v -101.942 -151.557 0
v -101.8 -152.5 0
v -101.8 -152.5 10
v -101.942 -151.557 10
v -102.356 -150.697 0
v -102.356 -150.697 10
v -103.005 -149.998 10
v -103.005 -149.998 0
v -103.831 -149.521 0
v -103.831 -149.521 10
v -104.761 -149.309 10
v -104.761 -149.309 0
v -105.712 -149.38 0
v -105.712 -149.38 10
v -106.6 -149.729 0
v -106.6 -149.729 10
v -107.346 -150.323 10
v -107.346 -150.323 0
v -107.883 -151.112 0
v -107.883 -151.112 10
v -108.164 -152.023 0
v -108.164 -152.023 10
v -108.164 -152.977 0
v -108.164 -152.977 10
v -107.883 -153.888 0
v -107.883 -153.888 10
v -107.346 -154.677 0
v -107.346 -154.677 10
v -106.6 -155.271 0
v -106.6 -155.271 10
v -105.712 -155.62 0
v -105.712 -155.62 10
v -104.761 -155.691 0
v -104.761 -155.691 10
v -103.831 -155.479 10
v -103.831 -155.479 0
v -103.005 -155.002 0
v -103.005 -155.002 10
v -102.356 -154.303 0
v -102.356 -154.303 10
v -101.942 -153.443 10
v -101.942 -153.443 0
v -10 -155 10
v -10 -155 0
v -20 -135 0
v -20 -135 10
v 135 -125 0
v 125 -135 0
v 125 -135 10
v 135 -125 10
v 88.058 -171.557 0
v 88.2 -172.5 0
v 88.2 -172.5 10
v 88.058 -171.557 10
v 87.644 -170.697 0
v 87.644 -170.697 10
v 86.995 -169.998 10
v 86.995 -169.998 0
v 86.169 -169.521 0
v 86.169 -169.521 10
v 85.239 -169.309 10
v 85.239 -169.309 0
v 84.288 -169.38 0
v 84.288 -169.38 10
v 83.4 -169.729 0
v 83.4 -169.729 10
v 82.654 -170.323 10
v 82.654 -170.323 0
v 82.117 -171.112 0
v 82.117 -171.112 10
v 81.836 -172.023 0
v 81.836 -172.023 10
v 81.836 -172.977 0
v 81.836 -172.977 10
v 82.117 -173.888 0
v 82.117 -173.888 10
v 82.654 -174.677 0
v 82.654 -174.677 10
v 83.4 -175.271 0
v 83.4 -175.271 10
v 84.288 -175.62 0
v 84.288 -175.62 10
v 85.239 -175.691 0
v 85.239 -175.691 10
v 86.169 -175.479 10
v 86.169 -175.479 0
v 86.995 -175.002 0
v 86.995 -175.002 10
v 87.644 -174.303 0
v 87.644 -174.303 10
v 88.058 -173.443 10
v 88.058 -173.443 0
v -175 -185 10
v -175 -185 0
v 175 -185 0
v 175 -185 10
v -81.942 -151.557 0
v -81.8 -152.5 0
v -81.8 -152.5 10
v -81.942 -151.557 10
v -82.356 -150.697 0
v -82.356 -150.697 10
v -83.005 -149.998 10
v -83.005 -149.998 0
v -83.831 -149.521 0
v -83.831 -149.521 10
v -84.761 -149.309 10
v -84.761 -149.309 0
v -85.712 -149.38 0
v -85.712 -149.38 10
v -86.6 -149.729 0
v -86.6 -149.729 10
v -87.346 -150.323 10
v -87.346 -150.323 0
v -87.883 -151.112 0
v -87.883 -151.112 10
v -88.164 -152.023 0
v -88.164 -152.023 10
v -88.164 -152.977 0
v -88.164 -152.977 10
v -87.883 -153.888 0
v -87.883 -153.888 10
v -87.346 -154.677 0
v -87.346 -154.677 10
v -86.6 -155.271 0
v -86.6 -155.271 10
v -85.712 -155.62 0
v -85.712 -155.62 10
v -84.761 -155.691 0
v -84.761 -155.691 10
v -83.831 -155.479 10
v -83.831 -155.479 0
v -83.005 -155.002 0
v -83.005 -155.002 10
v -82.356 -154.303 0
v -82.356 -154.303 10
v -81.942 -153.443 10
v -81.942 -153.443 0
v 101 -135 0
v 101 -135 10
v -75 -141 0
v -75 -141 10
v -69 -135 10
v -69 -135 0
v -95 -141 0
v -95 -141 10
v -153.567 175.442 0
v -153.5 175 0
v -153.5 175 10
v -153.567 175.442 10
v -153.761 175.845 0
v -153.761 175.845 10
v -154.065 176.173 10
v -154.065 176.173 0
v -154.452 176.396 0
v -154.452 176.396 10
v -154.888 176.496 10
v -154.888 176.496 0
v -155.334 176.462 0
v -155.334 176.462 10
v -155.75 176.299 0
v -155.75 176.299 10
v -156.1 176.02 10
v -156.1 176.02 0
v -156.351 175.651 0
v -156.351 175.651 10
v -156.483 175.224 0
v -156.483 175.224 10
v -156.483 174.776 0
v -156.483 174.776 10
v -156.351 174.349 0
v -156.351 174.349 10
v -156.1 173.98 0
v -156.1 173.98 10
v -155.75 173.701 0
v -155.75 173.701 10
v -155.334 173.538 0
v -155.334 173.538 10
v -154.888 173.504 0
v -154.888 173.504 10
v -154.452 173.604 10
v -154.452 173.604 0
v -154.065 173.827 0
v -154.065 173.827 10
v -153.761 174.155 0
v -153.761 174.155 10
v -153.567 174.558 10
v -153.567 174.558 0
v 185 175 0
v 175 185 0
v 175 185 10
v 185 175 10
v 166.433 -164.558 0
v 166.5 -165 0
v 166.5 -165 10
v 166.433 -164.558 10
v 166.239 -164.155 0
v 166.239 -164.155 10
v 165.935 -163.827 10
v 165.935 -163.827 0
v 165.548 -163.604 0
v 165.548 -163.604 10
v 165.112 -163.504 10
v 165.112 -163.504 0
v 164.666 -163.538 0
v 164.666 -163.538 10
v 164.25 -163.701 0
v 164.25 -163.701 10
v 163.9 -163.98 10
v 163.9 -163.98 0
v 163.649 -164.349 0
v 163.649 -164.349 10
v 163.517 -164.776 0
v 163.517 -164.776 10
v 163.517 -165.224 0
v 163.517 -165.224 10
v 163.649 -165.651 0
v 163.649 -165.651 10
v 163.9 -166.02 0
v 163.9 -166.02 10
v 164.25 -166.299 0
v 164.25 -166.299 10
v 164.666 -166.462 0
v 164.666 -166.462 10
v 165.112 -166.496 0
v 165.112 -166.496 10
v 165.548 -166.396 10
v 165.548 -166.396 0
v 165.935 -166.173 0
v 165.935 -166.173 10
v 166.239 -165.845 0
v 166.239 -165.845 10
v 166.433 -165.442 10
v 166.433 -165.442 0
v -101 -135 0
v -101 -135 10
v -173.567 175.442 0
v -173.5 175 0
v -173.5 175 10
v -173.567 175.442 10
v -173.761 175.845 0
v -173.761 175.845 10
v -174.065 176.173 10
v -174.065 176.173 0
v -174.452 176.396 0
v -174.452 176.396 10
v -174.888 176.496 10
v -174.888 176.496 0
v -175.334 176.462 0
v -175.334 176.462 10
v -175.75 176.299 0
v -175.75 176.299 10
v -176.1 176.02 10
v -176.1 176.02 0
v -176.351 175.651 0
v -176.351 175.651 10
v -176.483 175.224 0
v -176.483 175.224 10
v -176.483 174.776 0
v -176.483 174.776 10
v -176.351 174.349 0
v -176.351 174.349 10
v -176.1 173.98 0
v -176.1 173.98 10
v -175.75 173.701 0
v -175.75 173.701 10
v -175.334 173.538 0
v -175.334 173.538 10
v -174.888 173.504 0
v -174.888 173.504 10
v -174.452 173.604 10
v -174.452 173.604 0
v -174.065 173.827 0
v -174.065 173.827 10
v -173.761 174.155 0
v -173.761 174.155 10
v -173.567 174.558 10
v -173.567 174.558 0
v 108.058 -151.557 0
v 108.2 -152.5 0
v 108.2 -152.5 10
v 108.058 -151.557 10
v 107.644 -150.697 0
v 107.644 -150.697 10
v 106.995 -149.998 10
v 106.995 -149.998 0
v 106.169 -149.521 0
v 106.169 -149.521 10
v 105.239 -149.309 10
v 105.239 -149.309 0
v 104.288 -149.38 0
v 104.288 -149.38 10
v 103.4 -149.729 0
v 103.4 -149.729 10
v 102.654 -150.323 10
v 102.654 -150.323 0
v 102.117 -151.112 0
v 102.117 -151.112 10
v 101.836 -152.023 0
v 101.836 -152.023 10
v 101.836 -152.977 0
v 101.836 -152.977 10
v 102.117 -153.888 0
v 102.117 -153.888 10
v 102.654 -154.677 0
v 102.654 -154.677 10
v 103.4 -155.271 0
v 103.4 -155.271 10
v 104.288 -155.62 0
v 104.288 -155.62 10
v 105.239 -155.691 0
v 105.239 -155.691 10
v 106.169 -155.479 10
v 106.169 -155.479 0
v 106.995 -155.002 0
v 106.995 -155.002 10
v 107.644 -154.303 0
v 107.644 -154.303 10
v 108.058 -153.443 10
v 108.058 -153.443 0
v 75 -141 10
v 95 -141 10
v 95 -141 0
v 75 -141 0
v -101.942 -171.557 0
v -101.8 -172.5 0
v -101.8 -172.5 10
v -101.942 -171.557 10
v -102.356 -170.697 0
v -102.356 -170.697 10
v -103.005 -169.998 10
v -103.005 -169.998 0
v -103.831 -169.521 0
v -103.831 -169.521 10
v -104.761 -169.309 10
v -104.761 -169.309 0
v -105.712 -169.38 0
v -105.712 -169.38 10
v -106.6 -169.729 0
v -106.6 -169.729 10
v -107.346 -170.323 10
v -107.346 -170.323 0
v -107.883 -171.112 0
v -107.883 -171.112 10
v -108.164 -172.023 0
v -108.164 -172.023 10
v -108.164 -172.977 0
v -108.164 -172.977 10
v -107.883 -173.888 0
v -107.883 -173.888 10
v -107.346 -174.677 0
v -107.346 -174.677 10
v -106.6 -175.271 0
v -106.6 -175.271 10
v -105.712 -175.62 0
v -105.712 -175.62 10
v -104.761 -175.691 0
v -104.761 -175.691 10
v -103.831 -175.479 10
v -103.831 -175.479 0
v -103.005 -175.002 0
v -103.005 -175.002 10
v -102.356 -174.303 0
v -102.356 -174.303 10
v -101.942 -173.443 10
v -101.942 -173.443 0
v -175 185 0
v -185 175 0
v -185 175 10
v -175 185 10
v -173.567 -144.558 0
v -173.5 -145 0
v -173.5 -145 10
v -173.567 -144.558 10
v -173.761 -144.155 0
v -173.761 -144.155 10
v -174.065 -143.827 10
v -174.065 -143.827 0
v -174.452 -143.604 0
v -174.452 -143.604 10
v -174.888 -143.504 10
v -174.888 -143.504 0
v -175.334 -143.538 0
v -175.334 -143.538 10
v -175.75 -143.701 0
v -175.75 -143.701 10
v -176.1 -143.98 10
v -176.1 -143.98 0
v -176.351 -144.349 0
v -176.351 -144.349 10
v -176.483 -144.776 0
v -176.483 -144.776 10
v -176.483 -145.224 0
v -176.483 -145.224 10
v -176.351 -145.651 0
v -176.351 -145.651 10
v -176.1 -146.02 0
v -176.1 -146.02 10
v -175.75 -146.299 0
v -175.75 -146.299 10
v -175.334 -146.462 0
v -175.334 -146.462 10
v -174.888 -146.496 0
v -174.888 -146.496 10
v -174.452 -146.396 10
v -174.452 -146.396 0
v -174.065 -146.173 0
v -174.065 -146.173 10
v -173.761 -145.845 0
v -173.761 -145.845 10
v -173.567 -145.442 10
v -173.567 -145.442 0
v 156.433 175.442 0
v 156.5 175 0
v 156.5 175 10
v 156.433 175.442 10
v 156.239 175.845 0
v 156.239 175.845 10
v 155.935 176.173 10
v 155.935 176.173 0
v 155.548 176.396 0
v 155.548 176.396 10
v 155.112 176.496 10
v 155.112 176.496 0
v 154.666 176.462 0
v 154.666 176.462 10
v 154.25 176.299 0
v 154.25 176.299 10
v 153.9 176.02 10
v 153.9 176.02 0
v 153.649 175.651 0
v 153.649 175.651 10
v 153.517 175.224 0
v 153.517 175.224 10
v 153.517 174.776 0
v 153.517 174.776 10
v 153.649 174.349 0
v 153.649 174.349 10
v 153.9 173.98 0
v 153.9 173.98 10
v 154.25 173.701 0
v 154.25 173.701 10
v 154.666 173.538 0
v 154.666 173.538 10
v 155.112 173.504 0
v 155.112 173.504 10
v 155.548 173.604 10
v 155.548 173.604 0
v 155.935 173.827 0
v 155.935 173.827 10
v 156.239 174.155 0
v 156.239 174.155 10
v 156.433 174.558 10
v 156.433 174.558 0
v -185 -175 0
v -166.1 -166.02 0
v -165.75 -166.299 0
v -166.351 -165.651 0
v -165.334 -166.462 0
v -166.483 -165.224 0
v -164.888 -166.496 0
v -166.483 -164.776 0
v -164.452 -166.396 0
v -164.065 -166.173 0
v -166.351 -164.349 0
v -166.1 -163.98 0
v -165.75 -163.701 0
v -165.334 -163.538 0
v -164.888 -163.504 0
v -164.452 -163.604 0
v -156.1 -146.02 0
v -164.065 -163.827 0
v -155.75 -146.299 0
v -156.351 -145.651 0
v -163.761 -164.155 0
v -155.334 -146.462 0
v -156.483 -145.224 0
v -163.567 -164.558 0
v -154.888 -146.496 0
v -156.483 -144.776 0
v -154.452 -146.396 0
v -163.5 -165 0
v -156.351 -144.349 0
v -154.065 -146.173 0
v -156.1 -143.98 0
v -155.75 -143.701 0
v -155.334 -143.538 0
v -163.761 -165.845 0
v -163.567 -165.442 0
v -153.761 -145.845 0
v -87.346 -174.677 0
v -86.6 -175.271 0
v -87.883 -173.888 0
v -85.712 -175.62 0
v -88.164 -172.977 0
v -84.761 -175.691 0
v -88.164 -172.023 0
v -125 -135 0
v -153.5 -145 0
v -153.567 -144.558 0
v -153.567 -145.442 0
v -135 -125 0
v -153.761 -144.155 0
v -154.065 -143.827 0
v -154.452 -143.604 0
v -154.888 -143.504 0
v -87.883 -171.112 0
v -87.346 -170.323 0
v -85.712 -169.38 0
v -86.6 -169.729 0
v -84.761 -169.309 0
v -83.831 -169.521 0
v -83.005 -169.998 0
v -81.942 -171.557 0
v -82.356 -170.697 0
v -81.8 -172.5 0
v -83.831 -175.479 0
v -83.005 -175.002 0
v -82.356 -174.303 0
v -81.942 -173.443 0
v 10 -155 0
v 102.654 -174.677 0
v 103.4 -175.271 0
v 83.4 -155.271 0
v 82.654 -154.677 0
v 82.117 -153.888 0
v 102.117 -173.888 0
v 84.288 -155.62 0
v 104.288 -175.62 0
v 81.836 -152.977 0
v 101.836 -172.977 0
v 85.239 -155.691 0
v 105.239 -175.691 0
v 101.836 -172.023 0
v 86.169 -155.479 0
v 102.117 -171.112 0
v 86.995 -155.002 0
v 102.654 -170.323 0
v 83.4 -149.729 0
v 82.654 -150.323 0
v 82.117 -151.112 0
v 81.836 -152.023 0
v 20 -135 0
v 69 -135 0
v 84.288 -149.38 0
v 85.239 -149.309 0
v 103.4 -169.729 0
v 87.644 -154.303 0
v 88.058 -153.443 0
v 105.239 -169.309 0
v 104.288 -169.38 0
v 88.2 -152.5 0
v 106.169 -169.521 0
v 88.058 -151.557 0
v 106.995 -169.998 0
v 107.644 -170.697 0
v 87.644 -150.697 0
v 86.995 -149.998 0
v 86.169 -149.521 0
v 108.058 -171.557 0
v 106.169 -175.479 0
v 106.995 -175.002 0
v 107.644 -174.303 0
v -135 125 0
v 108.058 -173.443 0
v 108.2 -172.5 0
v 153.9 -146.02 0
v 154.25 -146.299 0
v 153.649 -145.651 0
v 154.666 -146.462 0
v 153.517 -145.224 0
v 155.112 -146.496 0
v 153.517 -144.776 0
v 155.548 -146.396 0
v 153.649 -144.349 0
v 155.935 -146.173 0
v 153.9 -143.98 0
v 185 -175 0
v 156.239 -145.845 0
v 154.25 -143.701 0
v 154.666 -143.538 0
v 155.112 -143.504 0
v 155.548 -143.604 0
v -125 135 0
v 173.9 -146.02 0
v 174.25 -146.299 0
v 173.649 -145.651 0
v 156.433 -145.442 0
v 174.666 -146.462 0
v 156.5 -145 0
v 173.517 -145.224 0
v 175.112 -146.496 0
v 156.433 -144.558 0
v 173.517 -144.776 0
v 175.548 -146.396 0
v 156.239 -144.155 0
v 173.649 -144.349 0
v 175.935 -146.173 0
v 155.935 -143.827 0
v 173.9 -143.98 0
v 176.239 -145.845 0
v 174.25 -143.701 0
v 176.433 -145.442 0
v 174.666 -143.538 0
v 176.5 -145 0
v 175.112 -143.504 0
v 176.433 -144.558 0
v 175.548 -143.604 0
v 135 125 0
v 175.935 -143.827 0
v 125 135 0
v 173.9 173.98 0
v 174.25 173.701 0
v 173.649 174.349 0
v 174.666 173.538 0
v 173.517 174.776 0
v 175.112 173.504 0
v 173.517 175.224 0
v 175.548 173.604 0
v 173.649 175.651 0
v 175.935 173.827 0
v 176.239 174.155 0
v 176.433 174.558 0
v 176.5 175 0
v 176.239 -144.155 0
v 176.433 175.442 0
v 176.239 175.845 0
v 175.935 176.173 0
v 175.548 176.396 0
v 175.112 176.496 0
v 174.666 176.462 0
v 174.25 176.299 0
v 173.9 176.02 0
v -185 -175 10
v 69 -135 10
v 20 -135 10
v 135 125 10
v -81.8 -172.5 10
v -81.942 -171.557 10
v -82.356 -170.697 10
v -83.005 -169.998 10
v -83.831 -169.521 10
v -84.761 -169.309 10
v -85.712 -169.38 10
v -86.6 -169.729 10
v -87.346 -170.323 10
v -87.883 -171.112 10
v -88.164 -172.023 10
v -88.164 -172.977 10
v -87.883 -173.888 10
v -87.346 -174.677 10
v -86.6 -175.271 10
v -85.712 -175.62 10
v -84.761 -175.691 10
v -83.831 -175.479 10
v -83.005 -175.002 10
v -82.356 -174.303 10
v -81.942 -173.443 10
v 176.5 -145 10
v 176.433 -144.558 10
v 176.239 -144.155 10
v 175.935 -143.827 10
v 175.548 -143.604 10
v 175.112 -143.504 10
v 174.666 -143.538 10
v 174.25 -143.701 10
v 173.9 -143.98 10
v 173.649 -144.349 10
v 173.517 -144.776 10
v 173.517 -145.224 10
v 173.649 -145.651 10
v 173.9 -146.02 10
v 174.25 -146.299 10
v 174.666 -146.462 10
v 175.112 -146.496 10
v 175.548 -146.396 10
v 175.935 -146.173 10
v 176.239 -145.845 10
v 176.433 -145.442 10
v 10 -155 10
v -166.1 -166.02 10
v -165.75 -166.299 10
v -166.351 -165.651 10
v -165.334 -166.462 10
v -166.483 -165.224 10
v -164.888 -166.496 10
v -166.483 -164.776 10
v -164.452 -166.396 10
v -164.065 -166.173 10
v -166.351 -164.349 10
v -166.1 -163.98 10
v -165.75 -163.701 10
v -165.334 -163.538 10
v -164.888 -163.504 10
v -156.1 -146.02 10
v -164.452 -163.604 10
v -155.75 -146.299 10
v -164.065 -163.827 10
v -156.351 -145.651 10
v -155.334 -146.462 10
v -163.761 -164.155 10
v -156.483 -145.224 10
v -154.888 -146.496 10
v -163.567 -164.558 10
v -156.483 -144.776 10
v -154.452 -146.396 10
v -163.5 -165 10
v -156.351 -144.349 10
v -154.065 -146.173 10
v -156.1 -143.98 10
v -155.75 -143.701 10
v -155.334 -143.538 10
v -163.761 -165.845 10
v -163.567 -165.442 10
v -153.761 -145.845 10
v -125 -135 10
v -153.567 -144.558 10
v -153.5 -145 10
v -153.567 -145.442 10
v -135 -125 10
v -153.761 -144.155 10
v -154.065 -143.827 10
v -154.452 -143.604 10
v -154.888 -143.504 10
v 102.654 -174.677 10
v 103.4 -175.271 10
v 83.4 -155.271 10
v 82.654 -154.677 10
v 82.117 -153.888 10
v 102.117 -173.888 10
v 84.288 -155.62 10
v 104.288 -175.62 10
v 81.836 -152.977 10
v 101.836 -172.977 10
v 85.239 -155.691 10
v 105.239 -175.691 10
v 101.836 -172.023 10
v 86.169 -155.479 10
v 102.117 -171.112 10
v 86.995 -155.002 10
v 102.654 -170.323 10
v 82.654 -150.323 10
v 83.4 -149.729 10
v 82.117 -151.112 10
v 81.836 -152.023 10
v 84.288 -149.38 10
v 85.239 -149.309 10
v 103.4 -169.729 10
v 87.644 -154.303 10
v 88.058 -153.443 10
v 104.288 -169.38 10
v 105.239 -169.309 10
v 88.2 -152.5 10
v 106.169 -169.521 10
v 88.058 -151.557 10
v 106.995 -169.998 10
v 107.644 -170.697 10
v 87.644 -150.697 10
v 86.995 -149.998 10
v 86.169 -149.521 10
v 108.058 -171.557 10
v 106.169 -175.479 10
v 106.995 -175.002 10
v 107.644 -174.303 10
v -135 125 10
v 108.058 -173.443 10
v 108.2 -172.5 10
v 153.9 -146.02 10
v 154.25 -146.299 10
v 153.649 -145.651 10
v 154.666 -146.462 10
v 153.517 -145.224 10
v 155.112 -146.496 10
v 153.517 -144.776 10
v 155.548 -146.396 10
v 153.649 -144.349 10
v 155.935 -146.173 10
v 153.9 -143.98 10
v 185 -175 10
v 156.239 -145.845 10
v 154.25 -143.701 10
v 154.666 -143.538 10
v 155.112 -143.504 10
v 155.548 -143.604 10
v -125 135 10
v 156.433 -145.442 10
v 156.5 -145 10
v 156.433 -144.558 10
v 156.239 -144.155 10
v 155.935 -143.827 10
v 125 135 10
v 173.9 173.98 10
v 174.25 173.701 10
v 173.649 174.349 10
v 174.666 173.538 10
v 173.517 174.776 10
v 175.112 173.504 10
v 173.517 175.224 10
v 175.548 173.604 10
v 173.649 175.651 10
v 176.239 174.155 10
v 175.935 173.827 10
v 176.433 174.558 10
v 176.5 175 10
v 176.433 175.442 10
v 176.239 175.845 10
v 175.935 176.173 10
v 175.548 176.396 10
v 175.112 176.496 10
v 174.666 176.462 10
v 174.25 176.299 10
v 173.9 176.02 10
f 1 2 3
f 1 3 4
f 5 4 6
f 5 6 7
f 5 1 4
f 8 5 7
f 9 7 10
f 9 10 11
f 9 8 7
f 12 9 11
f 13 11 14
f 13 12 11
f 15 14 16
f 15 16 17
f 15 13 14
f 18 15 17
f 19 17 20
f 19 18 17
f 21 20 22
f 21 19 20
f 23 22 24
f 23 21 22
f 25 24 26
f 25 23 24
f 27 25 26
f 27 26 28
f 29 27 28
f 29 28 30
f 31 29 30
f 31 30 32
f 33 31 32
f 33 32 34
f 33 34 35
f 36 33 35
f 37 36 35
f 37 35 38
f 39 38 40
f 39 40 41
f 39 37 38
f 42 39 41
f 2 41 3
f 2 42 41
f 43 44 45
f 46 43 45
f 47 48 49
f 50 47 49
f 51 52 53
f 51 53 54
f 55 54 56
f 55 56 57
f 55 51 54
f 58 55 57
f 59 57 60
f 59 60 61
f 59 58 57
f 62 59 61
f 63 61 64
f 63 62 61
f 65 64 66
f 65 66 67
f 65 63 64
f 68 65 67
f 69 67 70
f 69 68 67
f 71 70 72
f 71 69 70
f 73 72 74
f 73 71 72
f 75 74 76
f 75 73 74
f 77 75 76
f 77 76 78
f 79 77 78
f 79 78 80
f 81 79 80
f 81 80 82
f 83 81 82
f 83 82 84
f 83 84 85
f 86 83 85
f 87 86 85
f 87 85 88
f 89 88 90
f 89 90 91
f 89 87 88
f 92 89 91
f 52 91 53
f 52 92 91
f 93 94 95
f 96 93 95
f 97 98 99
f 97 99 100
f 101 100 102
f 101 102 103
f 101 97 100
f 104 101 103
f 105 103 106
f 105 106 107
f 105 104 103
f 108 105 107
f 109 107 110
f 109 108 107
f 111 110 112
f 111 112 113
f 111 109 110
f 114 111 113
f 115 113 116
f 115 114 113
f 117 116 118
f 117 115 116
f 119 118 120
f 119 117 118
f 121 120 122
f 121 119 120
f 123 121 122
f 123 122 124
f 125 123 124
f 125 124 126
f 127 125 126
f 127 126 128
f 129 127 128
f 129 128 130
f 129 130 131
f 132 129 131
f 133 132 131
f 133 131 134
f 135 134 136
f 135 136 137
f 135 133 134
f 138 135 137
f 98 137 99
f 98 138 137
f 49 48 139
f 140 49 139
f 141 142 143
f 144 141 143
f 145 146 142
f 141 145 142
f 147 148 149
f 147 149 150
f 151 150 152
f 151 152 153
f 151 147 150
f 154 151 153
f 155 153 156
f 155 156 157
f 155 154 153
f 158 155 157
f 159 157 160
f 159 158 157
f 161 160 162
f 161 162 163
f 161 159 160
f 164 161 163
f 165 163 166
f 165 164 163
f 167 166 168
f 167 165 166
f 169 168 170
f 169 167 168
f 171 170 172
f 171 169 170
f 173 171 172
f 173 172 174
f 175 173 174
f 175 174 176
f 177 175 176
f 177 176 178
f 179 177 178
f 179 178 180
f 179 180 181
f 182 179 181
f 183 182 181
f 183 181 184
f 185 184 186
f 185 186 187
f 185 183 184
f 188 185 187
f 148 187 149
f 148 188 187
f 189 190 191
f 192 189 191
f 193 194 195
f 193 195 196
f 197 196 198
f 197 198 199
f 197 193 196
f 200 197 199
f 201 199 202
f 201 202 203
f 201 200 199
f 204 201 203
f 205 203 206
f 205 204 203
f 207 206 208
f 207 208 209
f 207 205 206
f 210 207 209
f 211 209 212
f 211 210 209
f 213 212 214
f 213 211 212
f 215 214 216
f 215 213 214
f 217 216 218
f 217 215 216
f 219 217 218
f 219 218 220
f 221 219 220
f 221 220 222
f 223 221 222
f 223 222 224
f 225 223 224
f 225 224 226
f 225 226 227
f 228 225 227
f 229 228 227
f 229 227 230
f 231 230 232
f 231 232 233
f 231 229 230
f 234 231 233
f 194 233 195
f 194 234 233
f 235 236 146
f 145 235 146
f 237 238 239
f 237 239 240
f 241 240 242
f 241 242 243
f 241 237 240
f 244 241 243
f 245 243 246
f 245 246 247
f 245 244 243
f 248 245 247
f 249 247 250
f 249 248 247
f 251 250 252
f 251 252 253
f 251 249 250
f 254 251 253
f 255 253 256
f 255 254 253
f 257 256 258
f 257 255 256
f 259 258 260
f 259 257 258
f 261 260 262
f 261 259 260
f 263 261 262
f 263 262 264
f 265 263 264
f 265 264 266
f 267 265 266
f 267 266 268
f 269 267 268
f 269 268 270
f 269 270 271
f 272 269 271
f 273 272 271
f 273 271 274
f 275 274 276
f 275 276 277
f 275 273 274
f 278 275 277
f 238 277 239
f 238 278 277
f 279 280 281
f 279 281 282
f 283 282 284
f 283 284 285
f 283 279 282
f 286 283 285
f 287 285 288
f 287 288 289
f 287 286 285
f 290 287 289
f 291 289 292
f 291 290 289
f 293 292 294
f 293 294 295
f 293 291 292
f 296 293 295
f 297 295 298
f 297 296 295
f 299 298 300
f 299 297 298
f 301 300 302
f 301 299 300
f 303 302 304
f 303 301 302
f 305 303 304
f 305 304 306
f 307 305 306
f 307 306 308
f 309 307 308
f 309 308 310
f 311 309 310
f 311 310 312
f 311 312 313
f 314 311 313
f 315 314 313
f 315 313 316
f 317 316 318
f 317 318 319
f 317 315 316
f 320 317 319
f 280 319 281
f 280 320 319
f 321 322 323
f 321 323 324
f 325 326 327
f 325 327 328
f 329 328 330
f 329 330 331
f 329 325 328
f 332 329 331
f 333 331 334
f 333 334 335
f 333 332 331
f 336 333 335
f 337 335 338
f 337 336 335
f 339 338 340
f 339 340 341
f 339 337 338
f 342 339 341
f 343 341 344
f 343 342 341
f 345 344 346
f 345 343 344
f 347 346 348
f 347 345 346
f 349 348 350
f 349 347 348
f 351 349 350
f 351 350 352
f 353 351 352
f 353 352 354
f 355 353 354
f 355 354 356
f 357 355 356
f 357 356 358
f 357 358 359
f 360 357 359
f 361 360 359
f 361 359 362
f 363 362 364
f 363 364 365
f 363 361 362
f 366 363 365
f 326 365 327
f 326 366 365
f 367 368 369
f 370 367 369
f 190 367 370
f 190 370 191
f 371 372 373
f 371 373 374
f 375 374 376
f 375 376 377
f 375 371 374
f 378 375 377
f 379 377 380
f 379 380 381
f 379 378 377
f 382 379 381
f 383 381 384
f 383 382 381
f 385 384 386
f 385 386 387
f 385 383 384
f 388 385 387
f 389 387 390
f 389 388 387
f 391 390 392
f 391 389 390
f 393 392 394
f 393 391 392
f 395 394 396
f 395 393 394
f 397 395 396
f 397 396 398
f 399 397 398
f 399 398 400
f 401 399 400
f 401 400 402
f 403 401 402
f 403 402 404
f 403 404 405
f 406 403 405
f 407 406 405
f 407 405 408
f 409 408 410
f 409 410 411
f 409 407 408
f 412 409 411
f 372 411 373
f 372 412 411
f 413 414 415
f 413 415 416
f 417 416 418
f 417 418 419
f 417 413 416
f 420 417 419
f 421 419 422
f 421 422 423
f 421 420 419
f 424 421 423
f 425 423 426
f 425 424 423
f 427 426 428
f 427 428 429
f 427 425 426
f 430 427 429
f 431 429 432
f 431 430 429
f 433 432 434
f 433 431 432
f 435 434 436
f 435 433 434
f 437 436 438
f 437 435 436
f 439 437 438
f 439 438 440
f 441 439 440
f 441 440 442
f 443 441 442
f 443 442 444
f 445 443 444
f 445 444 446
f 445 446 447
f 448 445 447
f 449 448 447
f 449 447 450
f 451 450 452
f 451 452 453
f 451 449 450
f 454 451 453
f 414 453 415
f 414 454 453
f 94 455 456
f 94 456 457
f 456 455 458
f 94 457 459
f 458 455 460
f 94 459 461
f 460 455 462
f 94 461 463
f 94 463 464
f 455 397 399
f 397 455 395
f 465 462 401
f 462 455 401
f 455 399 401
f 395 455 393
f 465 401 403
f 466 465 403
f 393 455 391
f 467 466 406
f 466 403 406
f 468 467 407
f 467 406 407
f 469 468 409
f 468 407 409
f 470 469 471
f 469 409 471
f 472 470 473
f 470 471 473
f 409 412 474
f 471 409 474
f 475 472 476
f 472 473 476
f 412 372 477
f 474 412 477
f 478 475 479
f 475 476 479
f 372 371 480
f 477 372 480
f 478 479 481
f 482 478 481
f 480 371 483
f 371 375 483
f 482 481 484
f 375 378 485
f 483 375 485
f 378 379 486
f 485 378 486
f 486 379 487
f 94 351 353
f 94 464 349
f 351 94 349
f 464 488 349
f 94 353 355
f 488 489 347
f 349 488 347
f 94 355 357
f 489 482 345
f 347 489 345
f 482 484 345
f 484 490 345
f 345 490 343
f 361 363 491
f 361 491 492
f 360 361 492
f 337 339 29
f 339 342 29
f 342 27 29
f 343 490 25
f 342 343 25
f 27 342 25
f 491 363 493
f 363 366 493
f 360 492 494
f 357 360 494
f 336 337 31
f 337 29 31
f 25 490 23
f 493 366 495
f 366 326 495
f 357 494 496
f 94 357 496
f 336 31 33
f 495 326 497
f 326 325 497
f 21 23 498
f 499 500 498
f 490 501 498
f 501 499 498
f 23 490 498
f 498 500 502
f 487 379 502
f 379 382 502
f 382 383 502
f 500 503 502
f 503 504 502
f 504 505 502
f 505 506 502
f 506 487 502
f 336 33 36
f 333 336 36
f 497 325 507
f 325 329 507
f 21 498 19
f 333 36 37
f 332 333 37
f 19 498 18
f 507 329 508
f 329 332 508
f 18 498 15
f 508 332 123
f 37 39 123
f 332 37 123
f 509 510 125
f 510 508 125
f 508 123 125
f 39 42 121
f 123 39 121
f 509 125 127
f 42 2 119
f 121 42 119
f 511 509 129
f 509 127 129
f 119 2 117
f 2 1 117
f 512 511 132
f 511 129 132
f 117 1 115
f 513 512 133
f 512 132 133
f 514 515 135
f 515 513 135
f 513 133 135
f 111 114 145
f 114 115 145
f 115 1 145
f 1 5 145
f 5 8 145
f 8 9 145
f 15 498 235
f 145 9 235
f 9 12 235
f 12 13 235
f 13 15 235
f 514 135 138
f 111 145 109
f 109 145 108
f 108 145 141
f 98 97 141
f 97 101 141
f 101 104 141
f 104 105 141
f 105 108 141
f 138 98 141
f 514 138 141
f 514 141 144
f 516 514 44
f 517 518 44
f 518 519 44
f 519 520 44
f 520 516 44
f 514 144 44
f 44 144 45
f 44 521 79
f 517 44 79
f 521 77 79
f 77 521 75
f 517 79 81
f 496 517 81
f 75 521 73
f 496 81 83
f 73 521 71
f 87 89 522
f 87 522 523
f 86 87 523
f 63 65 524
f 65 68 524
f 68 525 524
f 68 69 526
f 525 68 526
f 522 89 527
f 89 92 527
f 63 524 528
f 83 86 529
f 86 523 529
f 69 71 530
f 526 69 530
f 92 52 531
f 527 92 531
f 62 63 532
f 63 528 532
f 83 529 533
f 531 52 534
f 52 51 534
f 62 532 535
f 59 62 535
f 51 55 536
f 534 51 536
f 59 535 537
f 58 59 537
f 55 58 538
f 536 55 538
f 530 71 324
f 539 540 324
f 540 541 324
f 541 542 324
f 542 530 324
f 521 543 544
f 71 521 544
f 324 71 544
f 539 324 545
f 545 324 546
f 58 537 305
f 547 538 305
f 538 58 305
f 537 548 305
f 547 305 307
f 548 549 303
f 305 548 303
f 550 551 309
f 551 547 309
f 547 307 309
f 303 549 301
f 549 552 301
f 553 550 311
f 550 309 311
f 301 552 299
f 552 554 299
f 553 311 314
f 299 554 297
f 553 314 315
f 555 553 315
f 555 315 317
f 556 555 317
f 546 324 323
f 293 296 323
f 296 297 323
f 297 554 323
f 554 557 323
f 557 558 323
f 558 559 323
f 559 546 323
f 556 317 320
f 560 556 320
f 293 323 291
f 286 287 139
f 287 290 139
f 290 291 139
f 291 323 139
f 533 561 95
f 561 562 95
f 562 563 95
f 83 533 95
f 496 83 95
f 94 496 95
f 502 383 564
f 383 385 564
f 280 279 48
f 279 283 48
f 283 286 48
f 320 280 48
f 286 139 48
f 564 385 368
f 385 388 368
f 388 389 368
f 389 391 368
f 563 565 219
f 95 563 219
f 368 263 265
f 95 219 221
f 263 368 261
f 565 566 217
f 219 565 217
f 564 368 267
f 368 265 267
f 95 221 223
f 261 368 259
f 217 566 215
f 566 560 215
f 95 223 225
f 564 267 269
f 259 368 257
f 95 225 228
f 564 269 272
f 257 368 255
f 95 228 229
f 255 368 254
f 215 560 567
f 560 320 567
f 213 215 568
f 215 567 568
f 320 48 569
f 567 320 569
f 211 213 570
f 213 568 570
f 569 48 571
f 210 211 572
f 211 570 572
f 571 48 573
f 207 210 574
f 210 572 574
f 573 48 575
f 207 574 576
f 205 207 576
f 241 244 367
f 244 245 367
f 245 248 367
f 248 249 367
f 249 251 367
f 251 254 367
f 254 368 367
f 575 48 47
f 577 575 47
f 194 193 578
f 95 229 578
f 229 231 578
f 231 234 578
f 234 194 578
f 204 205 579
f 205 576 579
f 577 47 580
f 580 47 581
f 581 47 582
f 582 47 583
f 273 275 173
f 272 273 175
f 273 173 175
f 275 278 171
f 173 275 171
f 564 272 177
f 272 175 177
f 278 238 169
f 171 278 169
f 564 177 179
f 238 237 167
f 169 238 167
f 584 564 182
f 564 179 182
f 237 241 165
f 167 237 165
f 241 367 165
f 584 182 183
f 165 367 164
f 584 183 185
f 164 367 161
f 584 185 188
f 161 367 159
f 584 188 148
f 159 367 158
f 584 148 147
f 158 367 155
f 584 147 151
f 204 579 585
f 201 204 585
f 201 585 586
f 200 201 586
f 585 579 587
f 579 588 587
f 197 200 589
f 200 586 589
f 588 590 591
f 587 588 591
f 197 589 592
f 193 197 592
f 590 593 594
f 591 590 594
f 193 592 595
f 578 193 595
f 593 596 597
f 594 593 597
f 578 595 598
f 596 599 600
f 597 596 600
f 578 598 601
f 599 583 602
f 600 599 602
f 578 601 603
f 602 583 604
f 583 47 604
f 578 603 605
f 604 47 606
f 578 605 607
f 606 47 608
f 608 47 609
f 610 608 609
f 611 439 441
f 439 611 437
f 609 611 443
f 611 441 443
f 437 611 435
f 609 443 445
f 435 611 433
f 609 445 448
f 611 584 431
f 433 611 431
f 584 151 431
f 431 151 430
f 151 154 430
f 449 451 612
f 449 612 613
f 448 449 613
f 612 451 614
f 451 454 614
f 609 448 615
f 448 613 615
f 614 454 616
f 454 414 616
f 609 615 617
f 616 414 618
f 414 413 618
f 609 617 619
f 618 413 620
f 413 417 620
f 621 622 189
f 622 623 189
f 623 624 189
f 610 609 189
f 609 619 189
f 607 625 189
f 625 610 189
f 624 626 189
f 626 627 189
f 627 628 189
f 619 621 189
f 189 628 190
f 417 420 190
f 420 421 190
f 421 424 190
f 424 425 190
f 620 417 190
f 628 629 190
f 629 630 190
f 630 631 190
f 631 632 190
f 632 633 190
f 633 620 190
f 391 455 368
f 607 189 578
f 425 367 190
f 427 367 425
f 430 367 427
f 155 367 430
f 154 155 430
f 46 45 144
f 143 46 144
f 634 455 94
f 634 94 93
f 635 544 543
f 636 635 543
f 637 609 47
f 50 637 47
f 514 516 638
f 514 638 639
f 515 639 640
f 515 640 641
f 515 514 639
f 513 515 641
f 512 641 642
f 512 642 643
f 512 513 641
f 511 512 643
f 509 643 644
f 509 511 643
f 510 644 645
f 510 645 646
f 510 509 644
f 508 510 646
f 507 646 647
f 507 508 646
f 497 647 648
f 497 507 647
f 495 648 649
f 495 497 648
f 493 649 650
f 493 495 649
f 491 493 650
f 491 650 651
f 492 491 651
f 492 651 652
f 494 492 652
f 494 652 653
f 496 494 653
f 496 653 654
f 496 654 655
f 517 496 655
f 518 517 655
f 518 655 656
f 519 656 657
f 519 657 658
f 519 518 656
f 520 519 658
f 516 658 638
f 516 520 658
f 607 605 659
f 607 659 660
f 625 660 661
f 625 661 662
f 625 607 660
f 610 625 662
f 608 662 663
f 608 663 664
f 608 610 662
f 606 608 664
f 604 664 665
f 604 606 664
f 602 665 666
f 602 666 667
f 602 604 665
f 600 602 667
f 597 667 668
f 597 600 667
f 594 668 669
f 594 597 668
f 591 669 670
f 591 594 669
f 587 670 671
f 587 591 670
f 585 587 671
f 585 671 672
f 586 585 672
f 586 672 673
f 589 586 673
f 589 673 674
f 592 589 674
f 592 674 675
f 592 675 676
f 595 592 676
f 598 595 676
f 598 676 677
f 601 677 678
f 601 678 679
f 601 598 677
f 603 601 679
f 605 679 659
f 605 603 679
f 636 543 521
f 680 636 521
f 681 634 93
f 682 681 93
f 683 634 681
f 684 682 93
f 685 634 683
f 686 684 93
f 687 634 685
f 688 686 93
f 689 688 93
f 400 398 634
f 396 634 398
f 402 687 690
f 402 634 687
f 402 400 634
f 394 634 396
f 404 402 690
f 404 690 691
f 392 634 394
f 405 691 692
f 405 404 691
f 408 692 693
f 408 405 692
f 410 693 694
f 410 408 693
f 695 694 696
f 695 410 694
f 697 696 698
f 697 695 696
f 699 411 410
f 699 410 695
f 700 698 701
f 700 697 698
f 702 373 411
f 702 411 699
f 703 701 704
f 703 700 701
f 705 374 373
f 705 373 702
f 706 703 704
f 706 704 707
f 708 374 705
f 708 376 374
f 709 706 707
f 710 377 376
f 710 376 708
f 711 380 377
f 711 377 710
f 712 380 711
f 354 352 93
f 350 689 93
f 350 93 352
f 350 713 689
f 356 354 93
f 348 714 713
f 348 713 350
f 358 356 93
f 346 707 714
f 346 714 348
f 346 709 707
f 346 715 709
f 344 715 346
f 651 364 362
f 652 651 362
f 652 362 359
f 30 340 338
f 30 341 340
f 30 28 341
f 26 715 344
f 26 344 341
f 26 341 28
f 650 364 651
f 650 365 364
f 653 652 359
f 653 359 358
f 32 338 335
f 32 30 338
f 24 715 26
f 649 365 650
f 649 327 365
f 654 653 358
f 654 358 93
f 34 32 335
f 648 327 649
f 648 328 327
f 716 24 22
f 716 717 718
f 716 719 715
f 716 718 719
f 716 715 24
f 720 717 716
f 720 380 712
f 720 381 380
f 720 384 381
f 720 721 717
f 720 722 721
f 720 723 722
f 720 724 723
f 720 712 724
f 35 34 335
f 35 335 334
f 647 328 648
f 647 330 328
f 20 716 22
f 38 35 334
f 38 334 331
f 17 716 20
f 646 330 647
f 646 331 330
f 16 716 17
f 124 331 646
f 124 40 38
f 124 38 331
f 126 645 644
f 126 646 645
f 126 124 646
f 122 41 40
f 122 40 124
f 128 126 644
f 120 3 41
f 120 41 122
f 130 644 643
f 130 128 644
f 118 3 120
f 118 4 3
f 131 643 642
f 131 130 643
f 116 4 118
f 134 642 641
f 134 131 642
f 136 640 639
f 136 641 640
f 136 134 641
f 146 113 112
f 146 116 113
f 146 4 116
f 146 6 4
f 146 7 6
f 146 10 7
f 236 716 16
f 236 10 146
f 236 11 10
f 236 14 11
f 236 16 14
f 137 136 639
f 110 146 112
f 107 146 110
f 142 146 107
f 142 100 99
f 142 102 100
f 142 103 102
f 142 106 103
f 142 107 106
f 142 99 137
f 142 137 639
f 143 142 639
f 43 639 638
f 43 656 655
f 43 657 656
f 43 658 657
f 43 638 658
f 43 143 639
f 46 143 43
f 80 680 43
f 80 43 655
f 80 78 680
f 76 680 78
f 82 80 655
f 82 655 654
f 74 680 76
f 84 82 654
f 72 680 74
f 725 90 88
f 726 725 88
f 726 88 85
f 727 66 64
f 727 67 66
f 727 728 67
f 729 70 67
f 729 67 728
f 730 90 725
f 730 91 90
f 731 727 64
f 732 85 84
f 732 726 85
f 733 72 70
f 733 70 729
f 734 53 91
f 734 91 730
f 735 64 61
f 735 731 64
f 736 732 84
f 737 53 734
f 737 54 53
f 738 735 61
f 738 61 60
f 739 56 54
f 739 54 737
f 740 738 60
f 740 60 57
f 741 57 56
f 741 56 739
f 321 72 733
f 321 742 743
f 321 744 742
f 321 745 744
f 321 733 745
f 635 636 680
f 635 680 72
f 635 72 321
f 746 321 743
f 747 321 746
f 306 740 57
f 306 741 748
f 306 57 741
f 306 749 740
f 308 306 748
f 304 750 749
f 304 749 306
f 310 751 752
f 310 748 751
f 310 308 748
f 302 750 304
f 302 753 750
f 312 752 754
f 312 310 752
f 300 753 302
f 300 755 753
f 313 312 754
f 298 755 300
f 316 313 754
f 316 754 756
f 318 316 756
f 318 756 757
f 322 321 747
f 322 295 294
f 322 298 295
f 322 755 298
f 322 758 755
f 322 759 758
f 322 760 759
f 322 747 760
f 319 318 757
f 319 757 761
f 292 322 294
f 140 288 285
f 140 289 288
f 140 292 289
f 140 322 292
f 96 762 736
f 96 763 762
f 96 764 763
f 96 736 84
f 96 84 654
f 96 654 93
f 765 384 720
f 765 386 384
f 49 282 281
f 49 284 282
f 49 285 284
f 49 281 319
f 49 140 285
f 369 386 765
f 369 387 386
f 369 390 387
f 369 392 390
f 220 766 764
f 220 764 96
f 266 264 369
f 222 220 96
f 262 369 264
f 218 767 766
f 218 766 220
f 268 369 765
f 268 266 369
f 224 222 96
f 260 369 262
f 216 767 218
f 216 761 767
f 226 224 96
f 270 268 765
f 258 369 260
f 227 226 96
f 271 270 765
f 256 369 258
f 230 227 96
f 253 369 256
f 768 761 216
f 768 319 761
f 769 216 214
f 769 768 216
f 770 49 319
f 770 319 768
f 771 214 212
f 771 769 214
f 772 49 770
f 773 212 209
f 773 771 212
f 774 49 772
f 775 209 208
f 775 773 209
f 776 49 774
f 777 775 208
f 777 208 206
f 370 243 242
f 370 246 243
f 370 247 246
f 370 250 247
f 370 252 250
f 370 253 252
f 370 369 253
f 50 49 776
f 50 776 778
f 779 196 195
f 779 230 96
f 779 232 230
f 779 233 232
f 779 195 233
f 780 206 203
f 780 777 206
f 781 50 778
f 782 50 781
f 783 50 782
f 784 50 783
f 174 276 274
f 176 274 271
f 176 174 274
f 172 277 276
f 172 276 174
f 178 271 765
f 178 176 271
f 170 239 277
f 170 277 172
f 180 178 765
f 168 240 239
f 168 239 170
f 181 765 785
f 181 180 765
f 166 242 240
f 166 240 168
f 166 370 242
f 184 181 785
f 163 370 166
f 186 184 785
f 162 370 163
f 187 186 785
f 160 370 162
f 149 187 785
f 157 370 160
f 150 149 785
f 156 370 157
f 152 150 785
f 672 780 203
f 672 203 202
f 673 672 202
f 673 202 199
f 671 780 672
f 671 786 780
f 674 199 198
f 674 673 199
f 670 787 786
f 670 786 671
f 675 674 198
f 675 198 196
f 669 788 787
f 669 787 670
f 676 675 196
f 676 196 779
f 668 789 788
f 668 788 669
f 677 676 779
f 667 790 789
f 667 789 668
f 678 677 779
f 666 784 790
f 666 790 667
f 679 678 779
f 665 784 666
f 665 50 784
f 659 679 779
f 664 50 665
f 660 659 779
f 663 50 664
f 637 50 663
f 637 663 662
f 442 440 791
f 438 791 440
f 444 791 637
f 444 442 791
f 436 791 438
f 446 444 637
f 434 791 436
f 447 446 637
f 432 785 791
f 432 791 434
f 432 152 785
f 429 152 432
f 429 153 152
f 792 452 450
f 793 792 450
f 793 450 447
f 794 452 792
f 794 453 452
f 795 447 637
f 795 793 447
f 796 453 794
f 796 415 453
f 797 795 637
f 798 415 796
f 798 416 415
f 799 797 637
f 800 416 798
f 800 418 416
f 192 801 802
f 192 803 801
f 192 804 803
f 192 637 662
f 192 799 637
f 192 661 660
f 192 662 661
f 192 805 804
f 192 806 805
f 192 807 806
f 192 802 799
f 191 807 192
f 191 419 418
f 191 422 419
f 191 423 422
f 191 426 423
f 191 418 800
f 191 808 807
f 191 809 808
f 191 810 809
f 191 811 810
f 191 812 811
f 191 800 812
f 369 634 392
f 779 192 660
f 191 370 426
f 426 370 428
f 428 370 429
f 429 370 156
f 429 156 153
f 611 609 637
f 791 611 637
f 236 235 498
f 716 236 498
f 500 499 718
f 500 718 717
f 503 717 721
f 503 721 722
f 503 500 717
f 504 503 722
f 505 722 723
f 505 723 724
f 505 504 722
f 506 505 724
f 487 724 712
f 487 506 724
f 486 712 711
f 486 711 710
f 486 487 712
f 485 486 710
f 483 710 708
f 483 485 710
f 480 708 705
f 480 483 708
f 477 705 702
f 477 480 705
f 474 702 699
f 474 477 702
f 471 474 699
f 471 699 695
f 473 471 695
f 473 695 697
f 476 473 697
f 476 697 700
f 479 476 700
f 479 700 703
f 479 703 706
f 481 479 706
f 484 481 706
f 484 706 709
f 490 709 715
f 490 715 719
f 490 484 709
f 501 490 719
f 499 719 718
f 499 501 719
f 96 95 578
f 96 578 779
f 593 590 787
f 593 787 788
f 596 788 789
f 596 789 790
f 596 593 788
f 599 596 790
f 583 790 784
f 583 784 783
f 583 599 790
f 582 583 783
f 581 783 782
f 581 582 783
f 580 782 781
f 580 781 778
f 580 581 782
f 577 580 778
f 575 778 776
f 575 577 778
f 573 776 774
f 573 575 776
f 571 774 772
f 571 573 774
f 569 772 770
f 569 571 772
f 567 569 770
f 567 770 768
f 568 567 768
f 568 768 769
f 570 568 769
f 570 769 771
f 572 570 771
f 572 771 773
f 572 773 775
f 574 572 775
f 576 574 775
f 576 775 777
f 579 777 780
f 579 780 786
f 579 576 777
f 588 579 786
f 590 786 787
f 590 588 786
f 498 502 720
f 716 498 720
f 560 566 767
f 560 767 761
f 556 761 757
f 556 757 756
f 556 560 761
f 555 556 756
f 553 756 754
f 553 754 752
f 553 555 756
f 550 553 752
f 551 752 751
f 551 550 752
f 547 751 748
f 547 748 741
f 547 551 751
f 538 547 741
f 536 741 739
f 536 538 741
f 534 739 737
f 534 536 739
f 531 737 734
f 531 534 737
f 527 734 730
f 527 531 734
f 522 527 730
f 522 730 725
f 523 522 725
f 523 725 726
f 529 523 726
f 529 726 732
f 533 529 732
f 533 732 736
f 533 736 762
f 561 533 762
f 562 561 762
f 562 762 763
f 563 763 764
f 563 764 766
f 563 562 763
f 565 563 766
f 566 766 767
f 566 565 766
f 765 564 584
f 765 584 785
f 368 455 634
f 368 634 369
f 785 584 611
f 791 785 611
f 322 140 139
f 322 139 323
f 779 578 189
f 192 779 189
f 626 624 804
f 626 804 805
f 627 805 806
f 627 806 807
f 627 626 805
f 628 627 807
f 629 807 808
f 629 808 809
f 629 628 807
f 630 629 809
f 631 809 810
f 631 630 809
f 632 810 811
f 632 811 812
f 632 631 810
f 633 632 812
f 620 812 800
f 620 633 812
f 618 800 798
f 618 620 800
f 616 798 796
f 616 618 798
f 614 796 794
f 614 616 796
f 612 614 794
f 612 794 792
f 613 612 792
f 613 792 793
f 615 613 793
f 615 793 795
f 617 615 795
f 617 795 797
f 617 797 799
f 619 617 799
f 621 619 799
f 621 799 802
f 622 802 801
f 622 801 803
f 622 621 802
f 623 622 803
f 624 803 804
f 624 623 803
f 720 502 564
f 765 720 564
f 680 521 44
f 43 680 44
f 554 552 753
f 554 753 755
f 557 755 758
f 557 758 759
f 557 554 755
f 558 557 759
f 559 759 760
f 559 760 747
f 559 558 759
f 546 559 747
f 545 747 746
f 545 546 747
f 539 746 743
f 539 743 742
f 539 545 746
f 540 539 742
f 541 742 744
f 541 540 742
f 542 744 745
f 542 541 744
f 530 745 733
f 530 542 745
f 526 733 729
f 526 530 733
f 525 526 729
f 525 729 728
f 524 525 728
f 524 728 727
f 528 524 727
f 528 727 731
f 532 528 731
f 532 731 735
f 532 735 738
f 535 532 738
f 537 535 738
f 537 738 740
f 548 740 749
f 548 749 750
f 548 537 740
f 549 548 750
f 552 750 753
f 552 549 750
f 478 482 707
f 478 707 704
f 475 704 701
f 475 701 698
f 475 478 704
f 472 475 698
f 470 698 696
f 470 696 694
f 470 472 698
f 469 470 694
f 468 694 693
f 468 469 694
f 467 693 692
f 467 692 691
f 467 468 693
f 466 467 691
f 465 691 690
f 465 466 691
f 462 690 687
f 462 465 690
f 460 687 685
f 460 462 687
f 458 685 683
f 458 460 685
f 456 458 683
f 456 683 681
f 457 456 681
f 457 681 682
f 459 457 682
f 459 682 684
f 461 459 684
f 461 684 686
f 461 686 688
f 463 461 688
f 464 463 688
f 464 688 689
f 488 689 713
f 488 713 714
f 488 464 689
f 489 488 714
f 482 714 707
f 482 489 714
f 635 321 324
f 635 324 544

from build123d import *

# Parameters (mm, degrees)
SKETCH1_W           = 370
SKETCH1_H           = 370
SKETCH1_R           = 3.2
SKETCH1_R_2         = 1.5
BOSS_EXTRUDE1_DEPTH = 10
CHAMFER1_SIZE       = 10
CUT_EXTRUDE1_DEPTH  = 10


with BuildPart() as part:
    # Sketch1 → Boss-Extrude1 (new body)
    with BuildSketch(Plane.XY):
        Rectangle(SKETCH1_W, SKETCH1_H)
        with Locations((85, -152.5)):
            Circle(SKETCH1_R, mode=Mode.SUBTRACT)
        with Locations((85, -172.5)):
            Circle(SKETCH1_R, mode=Mode.SUBTRACT)
        with Locations((105, -152.5)):
            Circle(SKETCH1_R, mode=Mode.SUBTRACT)
        with Locations((105, -172.5)):
            Circle(SKETCH1_R, mode=Mode.SUBTRACT)
        with Locations((-105, -172.5)):
            Circle(SKETCH1_R, mode=Mode.SUBTRACT)
        with Locations((-105, -152.5)):
            Circle(SKETCH1_R, mode=Mode.SUBTRACT)
        with Locations((-85, -172.5)):
            Circle(SKETCH1_R, mode=Mode.SUBTRACT)
        with Locations((-85, -152.5)):
            Circle(SKETCH1_R, mode=Mode.SUBTRACT)
        with Locations((155, -145)):
            Circle(SKETCH1_R_2, mode=Mode.SUBTRACT)
        with Locations((175, -145)):
            Circle(SKETCH1_R_2, mode=Mode.SUBTRACT)
        with Locations((165, -165)):
            Circle(SKETCH1_R_2, mode=Mode.SUBTRACT)
        with Locations((-155, -145)):
            Circle(SKETCH1_R_2, mode=Mode.SUBTRACT)
        with Locations((-175, -145)):
            Circle(SKETCH1_R_2, mode=Mode.SUBTRACT)
        with Locations((-165, -165)):
            Circle(SKETCH1_R_2, mode=Mode.SUBTRACT)
        with Locations((155, 175)):
            Circle(SKETCH1_R_2, mode=Mode.SUBTRACT)
        with Locations((175, 175)):
            Circle(SKETCH1_R_2, mode=Mode.SUBTRACT)
        with Locations((-155, 175)):
            Circle(SKETCH1_R_2, mode=Mode.SUBTRACT)
        with Locations((-175, 175)):
            Circle(SKETCH1_R_2, mode=Mode.SUBTRACT)
        Polygon((-135, 135), (135, 135), (135, -135), (20, -135), (10, -155), (-10, -155), (-20, -135), (-135, -135), align=None, mode=Mode.SUBTRACT)
    extrude(amount=BOSS_EXTRUDE1_DEPTH)

    # Chamfer1
    chamfer1_edges = [part.edges().sort_by_distance(p)[0] for p in [
        (135, -135, 5),
        (135, 135, 5),
        (-135, 135, 5),
        (-135, -135, 5),
        (-185, -185, 5),
        (-185, 185, 5),
        (185, 185, 5),
        (185, -185, 5),
    ]]
    chamfer(chamfer1_edges, length=CHAMFER1_SIZE)

    # Sketch2 → Cut-Extrude1 (cut)
    with BuildSketch(Plane.XY.offset(10)):
        Polygon((-101, -135), (-95, -141), (-75, -141), (-69, -135), align=None)
        Polygon((75, -141), (69, -135), (101, -135), (95, -141), align=None)
    extrude(amount=-CUT_EXTRUDE1_DEPTH, mode=Mode.SUBTRACT)


solid = part.part
